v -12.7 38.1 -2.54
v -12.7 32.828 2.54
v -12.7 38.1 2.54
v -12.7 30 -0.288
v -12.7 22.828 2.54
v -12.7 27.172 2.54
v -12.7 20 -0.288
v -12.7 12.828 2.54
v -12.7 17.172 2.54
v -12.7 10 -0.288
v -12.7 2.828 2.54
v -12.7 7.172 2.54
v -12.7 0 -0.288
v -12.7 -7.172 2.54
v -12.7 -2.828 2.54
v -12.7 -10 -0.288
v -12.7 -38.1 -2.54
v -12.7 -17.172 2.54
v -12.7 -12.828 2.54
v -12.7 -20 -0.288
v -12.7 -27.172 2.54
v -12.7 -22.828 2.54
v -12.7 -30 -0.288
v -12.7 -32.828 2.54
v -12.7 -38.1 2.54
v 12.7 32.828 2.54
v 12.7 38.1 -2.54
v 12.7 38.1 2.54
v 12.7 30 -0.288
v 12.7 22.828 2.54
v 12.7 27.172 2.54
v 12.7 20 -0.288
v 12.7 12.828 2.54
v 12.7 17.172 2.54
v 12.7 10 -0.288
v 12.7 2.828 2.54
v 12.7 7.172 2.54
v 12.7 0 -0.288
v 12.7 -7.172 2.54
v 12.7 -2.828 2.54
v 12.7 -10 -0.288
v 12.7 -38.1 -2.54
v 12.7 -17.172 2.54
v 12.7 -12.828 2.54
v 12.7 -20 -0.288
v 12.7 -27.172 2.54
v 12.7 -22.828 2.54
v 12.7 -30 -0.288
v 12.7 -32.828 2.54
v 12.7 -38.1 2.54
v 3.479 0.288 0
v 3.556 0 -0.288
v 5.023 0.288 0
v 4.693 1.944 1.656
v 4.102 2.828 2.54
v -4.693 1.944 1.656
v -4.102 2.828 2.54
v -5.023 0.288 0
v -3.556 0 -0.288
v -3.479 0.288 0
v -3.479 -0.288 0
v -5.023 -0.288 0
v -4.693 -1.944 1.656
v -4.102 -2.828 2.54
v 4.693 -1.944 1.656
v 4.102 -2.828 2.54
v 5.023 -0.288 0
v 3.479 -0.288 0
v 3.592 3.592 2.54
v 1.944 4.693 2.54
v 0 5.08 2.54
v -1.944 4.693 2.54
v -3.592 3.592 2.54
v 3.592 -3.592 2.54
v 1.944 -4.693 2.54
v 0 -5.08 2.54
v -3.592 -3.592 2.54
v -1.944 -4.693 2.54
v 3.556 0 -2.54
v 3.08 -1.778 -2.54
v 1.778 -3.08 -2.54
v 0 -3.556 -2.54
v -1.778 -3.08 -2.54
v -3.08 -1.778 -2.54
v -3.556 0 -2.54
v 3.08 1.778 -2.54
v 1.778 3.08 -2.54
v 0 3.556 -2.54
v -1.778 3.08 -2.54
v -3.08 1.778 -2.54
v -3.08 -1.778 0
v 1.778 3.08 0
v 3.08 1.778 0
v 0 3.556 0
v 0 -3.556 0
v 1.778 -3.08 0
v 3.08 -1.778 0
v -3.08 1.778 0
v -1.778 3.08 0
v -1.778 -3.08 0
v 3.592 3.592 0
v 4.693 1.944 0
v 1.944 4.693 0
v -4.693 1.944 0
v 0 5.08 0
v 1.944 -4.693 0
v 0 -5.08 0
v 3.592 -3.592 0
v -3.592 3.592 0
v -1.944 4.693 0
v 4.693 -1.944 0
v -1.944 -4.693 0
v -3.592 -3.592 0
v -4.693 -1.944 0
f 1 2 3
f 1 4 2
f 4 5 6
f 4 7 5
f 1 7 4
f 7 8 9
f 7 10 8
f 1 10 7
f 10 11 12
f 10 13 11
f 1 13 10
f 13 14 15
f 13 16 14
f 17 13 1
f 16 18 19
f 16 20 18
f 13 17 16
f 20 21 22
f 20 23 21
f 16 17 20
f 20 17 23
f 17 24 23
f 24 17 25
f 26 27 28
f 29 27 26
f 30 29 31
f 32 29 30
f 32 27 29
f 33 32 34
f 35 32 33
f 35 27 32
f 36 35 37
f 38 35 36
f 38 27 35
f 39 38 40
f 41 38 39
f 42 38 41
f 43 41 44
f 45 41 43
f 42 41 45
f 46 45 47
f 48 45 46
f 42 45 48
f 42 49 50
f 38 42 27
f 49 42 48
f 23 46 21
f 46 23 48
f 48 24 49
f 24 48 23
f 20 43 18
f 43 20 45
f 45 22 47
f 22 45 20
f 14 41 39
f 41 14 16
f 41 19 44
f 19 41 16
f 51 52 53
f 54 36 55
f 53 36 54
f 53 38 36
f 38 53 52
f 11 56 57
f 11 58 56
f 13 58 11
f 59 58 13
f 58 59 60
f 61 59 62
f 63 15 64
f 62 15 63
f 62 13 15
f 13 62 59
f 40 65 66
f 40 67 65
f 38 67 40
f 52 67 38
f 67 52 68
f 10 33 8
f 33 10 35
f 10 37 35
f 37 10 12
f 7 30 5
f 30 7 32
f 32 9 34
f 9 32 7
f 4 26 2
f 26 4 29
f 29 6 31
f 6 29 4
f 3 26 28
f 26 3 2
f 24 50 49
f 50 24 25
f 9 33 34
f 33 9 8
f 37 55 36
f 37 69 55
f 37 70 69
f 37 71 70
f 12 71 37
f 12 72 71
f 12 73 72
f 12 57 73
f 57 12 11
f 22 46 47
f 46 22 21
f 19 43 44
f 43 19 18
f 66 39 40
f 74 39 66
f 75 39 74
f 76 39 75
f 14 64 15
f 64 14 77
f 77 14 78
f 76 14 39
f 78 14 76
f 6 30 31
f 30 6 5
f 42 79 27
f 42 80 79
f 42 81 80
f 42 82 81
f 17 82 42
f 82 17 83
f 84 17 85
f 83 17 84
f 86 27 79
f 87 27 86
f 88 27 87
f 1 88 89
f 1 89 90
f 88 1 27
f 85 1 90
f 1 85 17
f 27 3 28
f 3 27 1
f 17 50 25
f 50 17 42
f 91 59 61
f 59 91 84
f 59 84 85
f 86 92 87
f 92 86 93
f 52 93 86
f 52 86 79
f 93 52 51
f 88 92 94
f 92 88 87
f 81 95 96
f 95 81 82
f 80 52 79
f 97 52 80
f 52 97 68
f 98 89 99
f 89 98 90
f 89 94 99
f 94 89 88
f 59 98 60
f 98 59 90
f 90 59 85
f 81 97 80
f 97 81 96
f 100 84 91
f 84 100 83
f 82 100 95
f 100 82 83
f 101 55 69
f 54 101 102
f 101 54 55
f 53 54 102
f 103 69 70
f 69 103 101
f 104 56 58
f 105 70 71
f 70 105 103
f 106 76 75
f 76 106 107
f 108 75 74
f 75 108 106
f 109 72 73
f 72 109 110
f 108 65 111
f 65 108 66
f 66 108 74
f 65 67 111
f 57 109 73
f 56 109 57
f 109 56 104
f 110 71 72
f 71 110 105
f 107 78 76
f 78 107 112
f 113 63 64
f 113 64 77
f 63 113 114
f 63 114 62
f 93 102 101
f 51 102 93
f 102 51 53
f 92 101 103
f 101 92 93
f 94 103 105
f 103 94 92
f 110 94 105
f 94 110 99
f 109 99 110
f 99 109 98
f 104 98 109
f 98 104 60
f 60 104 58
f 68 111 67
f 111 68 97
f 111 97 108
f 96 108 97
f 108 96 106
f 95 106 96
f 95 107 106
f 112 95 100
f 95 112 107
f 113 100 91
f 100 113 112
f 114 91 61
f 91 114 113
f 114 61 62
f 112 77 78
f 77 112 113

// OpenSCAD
in=25.4;

w=1*in;
l=3*in;
h=0.2*in;

n=3;

gw=4;
sp=10;

difference()
{
cube([w,l,h], center=true);
for(i=[-n:1:n])
	{
	echo(i);
	translate([0,i*sp,h/2]) rotate([45,0,0]) cube([w, gw,gw], center=true);
	}

cylinder(100,0.28*in/2 ,0.28*in/2,center=true);
translate([0,0,0.1*in])cylinder(h,0.4*in/2,0.4*in/2,center=true);

}
